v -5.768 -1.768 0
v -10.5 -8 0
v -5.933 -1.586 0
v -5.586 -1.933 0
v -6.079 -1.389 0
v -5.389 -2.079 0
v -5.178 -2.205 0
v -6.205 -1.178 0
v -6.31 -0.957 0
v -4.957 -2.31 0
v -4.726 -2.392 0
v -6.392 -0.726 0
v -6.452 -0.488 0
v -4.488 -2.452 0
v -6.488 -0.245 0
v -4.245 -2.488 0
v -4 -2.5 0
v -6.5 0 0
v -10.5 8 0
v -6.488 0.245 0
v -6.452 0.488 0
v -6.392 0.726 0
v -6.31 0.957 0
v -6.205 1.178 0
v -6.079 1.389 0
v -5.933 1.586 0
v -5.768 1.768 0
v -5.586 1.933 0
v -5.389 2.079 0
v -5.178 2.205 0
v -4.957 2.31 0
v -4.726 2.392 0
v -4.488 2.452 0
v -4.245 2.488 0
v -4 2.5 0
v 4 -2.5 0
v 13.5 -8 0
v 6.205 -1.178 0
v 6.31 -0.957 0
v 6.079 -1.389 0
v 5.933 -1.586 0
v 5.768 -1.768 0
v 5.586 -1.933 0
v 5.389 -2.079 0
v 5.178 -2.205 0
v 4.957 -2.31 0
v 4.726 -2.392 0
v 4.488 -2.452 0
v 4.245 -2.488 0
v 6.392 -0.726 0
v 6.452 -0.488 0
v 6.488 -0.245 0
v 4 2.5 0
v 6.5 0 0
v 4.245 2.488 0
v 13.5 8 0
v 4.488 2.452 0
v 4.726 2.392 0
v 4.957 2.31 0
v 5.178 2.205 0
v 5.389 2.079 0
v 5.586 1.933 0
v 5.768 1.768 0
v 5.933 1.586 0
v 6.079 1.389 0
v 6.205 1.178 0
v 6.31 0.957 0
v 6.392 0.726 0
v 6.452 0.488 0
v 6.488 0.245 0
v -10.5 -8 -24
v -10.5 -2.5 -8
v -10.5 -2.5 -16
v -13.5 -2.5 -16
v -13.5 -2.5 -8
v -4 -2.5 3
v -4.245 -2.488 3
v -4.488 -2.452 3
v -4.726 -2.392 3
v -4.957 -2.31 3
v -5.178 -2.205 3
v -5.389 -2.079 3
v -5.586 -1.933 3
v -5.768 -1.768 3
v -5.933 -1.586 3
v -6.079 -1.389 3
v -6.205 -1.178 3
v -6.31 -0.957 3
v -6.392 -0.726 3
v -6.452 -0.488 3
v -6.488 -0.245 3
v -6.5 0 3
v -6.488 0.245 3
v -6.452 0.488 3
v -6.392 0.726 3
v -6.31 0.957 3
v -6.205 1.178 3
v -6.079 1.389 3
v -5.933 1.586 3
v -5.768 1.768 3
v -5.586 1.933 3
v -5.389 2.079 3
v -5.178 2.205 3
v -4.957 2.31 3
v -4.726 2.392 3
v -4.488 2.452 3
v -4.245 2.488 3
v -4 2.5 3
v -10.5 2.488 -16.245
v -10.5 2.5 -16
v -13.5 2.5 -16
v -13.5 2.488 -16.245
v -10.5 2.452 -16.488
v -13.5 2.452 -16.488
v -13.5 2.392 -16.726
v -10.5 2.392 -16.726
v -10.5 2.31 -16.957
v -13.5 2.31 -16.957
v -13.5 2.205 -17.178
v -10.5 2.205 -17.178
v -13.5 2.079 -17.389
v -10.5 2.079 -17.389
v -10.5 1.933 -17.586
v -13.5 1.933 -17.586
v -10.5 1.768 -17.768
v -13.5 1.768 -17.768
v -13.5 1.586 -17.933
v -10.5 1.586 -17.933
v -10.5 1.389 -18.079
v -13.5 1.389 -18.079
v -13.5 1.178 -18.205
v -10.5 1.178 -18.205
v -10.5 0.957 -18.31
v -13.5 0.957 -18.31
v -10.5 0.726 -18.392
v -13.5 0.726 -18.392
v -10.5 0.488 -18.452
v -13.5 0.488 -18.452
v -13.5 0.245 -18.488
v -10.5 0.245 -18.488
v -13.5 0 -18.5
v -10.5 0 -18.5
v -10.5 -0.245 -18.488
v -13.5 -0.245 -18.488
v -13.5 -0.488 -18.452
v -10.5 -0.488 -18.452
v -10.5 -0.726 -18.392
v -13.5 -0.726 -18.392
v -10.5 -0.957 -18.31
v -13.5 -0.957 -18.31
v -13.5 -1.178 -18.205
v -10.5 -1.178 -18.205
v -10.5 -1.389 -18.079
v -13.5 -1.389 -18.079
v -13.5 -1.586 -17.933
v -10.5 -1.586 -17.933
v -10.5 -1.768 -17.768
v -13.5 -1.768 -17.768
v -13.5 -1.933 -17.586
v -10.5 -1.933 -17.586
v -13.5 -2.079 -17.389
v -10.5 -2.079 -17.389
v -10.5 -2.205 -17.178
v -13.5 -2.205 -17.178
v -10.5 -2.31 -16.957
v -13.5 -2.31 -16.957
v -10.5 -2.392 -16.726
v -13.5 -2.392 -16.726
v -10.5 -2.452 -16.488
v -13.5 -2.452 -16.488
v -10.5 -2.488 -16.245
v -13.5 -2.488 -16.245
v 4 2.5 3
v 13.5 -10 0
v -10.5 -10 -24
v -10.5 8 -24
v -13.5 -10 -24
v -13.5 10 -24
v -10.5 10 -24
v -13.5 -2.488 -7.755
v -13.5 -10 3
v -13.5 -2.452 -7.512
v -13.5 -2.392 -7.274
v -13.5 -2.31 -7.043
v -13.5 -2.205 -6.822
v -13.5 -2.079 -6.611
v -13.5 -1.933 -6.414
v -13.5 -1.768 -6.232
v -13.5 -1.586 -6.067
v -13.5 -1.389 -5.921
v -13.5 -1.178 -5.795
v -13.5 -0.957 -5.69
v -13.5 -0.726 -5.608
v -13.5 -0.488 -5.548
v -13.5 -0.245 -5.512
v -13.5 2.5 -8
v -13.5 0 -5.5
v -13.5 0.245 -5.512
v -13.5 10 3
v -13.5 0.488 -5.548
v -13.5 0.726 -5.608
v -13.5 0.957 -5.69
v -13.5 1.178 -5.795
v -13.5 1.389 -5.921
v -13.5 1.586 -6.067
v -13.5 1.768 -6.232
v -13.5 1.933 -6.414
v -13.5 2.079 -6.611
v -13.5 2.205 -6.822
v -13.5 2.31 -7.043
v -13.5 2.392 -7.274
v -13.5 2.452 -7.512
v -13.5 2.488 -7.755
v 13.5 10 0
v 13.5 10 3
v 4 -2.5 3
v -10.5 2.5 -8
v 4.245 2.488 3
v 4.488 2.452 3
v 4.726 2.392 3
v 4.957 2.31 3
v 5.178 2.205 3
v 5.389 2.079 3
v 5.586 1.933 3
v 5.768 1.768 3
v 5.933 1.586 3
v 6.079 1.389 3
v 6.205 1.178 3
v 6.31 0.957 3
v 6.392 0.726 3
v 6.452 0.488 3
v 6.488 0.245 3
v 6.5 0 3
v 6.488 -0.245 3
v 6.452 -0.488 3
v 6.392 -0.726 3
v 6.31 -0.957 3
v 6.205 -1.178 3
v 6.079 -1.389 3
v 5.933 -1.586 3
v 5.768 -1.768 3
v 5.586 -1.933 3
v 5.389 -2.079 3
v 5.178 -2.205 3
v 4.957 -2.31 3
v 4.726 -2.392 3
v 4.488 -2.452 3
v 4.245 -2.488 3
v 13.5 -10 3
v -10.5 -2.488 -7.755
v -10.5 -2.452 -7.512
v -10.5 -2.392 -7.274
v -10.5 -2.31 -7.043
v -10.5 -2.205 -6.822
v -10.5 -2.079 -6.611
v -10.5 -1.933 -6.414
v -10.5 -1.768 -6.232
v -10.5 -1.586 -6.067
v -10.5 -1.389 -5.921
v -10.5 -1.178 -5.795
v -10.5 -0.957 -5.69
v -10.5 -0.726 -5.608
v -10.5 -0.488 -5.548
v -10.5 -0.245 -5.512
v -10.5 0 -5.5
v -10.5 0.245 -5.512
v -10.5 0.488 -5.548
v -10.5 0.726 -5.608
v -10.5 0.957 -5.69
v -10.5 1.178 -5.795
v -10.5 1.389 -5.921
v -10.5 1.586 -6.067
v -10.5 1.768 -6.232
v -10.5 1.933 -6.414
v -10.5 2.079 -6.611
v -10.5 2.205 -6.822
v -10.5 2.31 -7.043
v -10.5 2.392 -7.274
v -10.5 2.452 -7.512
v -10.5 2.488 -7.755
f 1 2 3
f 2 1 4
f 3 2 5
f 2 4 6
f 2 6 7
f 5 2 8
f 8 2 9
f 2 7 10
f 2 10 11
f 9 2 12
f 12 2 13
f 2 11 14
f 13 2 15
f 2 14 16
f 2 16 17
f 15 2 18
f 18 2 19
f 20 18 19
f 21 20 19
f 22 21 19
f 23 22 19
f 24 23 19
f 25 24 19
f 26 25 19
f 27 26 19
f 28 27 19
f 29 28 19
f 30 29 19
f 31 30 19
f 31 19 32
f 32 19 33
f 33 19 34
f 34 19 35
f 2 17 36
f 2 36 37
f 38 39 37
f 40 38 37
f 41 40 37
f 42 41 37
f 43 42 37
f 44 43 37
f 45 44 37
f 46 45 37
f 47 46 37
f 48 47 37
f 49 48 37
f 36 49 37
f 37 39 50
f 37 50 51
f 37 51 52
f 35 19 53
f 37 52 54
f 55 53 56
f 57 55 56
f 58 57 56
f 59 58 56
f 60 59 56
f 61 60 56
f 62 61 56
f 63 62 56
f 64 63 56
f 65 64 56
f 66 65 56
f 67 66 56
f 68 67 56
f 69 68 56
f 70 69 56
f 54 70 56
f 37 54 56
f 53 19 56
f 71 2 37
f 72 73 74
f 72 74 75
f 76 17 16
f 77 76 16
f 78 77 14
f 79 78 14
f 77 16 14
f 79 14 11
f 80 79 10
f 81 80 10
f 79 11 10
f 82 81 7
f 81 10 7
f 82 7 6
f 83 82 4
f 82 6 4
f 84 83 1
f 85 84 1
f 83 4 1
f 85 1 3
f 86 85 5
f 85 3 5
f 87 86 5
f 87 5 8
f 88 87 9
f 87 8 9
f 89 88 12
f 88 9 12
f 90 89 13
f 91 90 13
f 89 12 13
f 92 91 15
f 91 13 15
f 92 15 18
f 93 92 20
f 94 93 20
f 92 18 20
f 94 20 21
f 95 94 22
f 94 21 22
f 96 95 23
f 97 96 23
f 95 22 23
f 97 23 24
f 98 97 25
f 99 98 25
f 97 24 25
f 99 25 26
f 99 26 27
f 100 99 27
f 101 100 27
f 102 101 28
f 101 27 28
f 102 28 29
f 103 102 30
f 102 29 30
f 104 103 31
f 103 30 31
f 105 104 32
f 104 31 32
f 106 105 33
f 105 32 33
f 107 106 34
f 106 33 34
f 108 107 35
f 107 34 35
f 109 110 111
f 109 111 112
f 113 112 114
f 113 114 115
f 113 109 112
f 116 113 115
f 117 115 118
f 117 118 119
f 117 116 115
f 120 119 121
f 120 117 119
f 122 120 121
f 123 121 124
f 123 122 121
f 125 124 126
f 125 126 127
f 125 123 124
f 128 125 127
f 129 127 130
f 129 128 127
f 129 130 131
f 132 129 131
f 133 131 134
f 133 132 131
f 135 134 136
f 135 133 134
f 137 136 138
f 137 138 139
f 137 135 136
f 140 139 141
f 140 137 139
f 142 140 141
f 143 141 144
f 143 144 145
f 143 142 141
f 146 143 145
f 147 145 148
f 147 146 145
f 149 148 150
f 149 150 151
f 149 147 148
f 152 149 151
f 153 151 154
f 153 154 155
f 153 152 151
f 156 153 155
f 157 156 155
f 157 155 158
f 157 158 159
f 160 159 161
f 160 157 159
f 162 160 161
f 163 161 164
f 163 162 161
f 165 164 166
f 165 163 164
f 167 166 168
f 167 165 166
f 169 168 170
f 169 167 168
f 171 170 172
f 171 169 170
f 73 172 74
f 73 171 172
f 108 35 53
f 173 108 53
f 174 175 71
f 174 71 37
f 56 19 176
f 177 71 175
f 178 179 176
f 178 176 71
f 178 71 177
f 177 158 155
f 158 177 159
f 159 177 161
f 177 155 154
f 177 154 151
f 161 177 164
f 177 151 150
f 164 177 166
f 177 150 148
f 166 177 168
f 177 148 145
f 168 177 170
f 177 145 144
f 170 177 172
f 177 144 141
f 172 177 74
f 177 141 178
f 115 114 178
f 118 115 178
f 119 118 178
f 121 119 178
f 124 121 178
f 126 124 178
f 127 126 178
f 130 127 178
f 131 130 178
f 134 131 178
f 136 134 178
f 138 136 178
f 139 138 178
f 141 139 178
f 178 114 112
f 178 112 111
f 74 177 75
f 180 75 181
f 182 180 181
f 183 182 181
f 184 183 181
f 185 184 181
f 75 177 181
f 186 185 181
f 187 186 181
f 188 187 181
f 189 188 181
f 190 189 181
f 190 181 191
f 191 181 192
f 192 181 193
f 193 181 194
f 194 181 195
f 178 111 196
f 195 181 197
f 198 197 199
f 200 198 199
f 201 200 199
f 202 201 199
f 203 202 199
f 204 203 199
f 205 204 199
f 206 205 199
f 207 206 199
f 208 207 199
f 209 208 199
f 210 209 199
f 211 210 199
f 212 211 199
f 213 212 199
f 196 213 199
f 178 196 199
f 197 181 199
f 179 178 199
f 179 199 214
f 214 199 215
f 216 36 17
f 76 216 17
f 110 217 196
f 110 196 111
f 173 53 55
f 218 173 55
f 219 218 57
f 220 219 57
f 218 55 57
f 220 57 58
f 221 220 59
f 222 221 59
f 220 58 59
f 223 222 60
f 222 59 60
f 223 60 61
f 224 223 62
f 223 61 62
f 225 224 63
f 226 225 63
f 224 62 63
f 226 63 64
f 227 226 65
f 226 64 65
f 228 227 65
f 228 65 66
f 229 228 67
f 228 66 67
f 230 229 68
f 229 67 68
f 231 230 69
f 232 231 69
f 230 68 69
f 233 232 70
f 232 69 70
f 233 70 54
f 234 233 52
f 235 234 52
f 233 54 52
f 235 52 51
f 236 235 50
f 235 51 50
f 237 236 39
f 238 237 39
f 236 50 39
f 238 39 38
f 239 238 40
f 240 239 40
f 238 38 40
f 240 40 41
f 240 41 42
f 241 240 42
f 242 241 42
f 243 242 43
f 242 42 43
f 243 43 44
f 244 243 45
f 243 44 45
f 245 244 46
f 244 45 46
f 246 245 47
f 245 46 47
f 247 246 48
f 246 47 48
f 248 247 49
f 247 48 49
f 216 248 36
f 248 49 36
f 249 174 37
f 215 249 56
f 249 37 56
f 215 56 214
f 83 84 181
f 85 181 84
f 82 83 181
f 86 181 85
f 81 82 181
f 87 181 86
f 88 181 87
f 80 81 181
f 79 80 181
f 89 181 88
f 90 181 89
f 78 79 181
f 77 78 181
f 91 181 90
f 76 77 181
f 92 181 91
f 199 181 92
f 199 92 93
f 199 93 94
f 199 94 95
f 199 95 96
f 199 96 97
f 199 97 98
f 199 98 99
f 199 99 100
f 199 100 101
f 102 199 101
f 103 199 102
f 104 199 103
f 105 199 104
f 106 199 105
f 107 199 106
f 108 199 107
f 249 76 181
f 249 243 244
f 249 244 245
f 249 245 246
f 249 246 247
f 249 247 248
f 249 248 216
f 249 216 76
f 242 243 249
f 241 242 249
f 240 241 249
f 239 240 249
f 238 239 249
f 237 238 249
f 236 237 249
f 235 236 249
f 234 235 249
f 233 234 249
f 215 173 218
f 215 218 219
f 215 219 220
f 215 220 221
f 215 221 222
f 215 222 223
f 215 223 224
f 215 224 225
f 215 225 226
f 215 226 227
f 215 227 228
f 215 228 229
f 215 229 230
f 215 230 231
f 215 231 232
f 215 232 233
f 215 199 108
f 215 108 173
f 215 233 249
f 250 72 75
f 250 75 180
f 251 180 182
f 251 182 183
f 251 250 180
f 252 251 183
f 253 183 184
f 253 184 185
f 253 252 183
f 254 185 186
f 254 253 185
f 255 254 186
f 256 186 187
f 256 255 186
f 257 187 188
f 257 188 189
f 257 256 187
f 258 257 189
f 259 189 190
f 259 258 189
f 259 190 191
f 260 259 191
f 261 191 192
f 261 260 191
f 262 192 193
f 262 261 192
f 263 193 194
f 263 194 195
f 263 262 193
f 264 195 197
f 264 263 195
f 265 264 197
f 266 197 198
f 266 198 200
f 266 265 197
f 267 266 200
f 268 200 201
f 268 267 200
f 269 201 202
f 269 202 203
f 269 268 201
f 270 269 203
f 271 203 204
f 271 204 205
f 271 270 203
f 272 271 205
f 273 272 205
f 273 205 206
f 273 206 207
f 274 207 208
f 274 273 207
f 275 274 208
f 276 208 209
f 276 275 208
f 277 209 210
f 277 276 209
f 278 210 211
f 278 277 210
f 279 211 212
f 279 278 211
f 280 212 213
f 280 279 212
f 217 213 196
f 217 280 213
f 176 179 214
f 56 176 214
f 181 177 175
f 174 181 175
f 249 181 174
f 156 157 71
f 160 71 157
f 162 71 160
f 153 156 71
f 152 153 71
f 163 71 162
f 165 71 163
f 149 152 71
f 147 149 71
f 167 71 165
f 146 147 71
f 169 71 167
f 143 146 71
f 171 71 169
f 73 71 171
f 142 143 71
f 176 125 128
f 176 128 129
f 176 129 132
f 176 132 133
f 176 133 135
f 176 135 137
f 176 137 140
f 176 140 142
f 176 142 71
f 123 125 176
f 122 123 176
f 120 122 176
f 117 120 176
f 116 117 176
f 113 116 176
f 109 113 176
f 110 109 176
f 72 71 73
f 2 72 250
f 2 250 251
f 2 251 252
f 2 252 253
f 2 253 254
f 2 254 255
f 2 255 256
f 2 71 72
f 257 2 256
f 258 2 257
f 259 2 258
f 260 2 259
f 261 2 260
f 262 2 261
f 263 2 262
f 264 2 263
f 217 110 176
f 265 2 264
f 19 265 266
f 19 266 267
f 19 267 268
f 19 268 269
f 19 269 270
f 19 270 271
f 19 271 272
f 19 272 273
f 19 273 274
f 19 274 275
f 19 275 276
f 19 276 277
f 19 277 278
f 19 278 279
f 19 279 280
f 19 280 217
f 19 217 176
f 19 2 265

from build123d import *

# Parameters (mm, degrees)
SKETCH1_W           = 27
SKETCH1_H           = 20
BOSS_EXTRUDE1_DEPTH = 3
SKETCH2_W           = 3
SKETCH2_H           = 20
BOSS_EXTRUDE2_DEPTH = 24
BOSS_EXTRUDE3_DEPTH = 2
CUT_EXTRUDE1_DEPTH  = 3


with BuildPart() as part:
    # Sketch1 → Boss-Extrude1 (new body)
    with BuildSketch(Plane.XY):
        Rectangle(SKETCH1_W, SKETCH1_H)
        with BuildLine():
            Line((4, -2.5), (-4, -2.5))
            ThreePointArc((-4, -2.5), (-6.5, 0), (-4, 2.5))
            Line((-4, 2.5), (4, 2.5))
            ThreePointArc((4, 2.5), (6.5, 0), (4, -2.5))
        make_face(mode=Mode.SUBTRACT)
    extrude(amount=BOSS_EXTRUDE1_DEPTH)

    # Sketch2 → Boss-Extrude2 (add)
    with BuildSketch(Plane(origin=(0, 0, 0), x_dir=(-1, 0, 0), z_dir=(0, 0, -1))):
        with Locations((12, 0)):
            Rectangle(SKETCH2_W, SKETCH2_H)
    extrude(amount=BOSS_EXTRUDE2_DEPTH)

    # Sketch3 → Boss-Extrude3 (add)
    with BuildSketch(Plane.XZ.offset(10)):
        Polygon((-10.5, -24), (13.5, 0), (13.5, 3), (-13.5, 3), (-13.5, -24), align=None)
    boss_extrude3 = extrude(amount=-BOSS_EXTRUDE3_DEPTH)

    # Mirror1: Boss-Extrude3 across plane
    add(boss_extrude3.mirror(Plane.ZX))

    # Sketch4 → Cut-Extrude1 (cut)
    with BuildSketch(Plane(origin=(-10.5, 0, 0), x_dir=(0, 0, -1), z_dir=(1, 0, 0))):
        with BuildLine():
            Line((8, 2.5), (16, 2.5))
            ThreePointArc((16, 2.5), (18.5, 0), (16, -2.5))
            Line((16, -2.5), (8, -2.5))
            ThreePointArc((8, -2.5), (5.5, 0), (8, 2.5))
        make_face()
    extrude(amount=-CUT_EXTRUDE1_DEPTH, mode=Mode.SUBTRACT)


solid = part.part
